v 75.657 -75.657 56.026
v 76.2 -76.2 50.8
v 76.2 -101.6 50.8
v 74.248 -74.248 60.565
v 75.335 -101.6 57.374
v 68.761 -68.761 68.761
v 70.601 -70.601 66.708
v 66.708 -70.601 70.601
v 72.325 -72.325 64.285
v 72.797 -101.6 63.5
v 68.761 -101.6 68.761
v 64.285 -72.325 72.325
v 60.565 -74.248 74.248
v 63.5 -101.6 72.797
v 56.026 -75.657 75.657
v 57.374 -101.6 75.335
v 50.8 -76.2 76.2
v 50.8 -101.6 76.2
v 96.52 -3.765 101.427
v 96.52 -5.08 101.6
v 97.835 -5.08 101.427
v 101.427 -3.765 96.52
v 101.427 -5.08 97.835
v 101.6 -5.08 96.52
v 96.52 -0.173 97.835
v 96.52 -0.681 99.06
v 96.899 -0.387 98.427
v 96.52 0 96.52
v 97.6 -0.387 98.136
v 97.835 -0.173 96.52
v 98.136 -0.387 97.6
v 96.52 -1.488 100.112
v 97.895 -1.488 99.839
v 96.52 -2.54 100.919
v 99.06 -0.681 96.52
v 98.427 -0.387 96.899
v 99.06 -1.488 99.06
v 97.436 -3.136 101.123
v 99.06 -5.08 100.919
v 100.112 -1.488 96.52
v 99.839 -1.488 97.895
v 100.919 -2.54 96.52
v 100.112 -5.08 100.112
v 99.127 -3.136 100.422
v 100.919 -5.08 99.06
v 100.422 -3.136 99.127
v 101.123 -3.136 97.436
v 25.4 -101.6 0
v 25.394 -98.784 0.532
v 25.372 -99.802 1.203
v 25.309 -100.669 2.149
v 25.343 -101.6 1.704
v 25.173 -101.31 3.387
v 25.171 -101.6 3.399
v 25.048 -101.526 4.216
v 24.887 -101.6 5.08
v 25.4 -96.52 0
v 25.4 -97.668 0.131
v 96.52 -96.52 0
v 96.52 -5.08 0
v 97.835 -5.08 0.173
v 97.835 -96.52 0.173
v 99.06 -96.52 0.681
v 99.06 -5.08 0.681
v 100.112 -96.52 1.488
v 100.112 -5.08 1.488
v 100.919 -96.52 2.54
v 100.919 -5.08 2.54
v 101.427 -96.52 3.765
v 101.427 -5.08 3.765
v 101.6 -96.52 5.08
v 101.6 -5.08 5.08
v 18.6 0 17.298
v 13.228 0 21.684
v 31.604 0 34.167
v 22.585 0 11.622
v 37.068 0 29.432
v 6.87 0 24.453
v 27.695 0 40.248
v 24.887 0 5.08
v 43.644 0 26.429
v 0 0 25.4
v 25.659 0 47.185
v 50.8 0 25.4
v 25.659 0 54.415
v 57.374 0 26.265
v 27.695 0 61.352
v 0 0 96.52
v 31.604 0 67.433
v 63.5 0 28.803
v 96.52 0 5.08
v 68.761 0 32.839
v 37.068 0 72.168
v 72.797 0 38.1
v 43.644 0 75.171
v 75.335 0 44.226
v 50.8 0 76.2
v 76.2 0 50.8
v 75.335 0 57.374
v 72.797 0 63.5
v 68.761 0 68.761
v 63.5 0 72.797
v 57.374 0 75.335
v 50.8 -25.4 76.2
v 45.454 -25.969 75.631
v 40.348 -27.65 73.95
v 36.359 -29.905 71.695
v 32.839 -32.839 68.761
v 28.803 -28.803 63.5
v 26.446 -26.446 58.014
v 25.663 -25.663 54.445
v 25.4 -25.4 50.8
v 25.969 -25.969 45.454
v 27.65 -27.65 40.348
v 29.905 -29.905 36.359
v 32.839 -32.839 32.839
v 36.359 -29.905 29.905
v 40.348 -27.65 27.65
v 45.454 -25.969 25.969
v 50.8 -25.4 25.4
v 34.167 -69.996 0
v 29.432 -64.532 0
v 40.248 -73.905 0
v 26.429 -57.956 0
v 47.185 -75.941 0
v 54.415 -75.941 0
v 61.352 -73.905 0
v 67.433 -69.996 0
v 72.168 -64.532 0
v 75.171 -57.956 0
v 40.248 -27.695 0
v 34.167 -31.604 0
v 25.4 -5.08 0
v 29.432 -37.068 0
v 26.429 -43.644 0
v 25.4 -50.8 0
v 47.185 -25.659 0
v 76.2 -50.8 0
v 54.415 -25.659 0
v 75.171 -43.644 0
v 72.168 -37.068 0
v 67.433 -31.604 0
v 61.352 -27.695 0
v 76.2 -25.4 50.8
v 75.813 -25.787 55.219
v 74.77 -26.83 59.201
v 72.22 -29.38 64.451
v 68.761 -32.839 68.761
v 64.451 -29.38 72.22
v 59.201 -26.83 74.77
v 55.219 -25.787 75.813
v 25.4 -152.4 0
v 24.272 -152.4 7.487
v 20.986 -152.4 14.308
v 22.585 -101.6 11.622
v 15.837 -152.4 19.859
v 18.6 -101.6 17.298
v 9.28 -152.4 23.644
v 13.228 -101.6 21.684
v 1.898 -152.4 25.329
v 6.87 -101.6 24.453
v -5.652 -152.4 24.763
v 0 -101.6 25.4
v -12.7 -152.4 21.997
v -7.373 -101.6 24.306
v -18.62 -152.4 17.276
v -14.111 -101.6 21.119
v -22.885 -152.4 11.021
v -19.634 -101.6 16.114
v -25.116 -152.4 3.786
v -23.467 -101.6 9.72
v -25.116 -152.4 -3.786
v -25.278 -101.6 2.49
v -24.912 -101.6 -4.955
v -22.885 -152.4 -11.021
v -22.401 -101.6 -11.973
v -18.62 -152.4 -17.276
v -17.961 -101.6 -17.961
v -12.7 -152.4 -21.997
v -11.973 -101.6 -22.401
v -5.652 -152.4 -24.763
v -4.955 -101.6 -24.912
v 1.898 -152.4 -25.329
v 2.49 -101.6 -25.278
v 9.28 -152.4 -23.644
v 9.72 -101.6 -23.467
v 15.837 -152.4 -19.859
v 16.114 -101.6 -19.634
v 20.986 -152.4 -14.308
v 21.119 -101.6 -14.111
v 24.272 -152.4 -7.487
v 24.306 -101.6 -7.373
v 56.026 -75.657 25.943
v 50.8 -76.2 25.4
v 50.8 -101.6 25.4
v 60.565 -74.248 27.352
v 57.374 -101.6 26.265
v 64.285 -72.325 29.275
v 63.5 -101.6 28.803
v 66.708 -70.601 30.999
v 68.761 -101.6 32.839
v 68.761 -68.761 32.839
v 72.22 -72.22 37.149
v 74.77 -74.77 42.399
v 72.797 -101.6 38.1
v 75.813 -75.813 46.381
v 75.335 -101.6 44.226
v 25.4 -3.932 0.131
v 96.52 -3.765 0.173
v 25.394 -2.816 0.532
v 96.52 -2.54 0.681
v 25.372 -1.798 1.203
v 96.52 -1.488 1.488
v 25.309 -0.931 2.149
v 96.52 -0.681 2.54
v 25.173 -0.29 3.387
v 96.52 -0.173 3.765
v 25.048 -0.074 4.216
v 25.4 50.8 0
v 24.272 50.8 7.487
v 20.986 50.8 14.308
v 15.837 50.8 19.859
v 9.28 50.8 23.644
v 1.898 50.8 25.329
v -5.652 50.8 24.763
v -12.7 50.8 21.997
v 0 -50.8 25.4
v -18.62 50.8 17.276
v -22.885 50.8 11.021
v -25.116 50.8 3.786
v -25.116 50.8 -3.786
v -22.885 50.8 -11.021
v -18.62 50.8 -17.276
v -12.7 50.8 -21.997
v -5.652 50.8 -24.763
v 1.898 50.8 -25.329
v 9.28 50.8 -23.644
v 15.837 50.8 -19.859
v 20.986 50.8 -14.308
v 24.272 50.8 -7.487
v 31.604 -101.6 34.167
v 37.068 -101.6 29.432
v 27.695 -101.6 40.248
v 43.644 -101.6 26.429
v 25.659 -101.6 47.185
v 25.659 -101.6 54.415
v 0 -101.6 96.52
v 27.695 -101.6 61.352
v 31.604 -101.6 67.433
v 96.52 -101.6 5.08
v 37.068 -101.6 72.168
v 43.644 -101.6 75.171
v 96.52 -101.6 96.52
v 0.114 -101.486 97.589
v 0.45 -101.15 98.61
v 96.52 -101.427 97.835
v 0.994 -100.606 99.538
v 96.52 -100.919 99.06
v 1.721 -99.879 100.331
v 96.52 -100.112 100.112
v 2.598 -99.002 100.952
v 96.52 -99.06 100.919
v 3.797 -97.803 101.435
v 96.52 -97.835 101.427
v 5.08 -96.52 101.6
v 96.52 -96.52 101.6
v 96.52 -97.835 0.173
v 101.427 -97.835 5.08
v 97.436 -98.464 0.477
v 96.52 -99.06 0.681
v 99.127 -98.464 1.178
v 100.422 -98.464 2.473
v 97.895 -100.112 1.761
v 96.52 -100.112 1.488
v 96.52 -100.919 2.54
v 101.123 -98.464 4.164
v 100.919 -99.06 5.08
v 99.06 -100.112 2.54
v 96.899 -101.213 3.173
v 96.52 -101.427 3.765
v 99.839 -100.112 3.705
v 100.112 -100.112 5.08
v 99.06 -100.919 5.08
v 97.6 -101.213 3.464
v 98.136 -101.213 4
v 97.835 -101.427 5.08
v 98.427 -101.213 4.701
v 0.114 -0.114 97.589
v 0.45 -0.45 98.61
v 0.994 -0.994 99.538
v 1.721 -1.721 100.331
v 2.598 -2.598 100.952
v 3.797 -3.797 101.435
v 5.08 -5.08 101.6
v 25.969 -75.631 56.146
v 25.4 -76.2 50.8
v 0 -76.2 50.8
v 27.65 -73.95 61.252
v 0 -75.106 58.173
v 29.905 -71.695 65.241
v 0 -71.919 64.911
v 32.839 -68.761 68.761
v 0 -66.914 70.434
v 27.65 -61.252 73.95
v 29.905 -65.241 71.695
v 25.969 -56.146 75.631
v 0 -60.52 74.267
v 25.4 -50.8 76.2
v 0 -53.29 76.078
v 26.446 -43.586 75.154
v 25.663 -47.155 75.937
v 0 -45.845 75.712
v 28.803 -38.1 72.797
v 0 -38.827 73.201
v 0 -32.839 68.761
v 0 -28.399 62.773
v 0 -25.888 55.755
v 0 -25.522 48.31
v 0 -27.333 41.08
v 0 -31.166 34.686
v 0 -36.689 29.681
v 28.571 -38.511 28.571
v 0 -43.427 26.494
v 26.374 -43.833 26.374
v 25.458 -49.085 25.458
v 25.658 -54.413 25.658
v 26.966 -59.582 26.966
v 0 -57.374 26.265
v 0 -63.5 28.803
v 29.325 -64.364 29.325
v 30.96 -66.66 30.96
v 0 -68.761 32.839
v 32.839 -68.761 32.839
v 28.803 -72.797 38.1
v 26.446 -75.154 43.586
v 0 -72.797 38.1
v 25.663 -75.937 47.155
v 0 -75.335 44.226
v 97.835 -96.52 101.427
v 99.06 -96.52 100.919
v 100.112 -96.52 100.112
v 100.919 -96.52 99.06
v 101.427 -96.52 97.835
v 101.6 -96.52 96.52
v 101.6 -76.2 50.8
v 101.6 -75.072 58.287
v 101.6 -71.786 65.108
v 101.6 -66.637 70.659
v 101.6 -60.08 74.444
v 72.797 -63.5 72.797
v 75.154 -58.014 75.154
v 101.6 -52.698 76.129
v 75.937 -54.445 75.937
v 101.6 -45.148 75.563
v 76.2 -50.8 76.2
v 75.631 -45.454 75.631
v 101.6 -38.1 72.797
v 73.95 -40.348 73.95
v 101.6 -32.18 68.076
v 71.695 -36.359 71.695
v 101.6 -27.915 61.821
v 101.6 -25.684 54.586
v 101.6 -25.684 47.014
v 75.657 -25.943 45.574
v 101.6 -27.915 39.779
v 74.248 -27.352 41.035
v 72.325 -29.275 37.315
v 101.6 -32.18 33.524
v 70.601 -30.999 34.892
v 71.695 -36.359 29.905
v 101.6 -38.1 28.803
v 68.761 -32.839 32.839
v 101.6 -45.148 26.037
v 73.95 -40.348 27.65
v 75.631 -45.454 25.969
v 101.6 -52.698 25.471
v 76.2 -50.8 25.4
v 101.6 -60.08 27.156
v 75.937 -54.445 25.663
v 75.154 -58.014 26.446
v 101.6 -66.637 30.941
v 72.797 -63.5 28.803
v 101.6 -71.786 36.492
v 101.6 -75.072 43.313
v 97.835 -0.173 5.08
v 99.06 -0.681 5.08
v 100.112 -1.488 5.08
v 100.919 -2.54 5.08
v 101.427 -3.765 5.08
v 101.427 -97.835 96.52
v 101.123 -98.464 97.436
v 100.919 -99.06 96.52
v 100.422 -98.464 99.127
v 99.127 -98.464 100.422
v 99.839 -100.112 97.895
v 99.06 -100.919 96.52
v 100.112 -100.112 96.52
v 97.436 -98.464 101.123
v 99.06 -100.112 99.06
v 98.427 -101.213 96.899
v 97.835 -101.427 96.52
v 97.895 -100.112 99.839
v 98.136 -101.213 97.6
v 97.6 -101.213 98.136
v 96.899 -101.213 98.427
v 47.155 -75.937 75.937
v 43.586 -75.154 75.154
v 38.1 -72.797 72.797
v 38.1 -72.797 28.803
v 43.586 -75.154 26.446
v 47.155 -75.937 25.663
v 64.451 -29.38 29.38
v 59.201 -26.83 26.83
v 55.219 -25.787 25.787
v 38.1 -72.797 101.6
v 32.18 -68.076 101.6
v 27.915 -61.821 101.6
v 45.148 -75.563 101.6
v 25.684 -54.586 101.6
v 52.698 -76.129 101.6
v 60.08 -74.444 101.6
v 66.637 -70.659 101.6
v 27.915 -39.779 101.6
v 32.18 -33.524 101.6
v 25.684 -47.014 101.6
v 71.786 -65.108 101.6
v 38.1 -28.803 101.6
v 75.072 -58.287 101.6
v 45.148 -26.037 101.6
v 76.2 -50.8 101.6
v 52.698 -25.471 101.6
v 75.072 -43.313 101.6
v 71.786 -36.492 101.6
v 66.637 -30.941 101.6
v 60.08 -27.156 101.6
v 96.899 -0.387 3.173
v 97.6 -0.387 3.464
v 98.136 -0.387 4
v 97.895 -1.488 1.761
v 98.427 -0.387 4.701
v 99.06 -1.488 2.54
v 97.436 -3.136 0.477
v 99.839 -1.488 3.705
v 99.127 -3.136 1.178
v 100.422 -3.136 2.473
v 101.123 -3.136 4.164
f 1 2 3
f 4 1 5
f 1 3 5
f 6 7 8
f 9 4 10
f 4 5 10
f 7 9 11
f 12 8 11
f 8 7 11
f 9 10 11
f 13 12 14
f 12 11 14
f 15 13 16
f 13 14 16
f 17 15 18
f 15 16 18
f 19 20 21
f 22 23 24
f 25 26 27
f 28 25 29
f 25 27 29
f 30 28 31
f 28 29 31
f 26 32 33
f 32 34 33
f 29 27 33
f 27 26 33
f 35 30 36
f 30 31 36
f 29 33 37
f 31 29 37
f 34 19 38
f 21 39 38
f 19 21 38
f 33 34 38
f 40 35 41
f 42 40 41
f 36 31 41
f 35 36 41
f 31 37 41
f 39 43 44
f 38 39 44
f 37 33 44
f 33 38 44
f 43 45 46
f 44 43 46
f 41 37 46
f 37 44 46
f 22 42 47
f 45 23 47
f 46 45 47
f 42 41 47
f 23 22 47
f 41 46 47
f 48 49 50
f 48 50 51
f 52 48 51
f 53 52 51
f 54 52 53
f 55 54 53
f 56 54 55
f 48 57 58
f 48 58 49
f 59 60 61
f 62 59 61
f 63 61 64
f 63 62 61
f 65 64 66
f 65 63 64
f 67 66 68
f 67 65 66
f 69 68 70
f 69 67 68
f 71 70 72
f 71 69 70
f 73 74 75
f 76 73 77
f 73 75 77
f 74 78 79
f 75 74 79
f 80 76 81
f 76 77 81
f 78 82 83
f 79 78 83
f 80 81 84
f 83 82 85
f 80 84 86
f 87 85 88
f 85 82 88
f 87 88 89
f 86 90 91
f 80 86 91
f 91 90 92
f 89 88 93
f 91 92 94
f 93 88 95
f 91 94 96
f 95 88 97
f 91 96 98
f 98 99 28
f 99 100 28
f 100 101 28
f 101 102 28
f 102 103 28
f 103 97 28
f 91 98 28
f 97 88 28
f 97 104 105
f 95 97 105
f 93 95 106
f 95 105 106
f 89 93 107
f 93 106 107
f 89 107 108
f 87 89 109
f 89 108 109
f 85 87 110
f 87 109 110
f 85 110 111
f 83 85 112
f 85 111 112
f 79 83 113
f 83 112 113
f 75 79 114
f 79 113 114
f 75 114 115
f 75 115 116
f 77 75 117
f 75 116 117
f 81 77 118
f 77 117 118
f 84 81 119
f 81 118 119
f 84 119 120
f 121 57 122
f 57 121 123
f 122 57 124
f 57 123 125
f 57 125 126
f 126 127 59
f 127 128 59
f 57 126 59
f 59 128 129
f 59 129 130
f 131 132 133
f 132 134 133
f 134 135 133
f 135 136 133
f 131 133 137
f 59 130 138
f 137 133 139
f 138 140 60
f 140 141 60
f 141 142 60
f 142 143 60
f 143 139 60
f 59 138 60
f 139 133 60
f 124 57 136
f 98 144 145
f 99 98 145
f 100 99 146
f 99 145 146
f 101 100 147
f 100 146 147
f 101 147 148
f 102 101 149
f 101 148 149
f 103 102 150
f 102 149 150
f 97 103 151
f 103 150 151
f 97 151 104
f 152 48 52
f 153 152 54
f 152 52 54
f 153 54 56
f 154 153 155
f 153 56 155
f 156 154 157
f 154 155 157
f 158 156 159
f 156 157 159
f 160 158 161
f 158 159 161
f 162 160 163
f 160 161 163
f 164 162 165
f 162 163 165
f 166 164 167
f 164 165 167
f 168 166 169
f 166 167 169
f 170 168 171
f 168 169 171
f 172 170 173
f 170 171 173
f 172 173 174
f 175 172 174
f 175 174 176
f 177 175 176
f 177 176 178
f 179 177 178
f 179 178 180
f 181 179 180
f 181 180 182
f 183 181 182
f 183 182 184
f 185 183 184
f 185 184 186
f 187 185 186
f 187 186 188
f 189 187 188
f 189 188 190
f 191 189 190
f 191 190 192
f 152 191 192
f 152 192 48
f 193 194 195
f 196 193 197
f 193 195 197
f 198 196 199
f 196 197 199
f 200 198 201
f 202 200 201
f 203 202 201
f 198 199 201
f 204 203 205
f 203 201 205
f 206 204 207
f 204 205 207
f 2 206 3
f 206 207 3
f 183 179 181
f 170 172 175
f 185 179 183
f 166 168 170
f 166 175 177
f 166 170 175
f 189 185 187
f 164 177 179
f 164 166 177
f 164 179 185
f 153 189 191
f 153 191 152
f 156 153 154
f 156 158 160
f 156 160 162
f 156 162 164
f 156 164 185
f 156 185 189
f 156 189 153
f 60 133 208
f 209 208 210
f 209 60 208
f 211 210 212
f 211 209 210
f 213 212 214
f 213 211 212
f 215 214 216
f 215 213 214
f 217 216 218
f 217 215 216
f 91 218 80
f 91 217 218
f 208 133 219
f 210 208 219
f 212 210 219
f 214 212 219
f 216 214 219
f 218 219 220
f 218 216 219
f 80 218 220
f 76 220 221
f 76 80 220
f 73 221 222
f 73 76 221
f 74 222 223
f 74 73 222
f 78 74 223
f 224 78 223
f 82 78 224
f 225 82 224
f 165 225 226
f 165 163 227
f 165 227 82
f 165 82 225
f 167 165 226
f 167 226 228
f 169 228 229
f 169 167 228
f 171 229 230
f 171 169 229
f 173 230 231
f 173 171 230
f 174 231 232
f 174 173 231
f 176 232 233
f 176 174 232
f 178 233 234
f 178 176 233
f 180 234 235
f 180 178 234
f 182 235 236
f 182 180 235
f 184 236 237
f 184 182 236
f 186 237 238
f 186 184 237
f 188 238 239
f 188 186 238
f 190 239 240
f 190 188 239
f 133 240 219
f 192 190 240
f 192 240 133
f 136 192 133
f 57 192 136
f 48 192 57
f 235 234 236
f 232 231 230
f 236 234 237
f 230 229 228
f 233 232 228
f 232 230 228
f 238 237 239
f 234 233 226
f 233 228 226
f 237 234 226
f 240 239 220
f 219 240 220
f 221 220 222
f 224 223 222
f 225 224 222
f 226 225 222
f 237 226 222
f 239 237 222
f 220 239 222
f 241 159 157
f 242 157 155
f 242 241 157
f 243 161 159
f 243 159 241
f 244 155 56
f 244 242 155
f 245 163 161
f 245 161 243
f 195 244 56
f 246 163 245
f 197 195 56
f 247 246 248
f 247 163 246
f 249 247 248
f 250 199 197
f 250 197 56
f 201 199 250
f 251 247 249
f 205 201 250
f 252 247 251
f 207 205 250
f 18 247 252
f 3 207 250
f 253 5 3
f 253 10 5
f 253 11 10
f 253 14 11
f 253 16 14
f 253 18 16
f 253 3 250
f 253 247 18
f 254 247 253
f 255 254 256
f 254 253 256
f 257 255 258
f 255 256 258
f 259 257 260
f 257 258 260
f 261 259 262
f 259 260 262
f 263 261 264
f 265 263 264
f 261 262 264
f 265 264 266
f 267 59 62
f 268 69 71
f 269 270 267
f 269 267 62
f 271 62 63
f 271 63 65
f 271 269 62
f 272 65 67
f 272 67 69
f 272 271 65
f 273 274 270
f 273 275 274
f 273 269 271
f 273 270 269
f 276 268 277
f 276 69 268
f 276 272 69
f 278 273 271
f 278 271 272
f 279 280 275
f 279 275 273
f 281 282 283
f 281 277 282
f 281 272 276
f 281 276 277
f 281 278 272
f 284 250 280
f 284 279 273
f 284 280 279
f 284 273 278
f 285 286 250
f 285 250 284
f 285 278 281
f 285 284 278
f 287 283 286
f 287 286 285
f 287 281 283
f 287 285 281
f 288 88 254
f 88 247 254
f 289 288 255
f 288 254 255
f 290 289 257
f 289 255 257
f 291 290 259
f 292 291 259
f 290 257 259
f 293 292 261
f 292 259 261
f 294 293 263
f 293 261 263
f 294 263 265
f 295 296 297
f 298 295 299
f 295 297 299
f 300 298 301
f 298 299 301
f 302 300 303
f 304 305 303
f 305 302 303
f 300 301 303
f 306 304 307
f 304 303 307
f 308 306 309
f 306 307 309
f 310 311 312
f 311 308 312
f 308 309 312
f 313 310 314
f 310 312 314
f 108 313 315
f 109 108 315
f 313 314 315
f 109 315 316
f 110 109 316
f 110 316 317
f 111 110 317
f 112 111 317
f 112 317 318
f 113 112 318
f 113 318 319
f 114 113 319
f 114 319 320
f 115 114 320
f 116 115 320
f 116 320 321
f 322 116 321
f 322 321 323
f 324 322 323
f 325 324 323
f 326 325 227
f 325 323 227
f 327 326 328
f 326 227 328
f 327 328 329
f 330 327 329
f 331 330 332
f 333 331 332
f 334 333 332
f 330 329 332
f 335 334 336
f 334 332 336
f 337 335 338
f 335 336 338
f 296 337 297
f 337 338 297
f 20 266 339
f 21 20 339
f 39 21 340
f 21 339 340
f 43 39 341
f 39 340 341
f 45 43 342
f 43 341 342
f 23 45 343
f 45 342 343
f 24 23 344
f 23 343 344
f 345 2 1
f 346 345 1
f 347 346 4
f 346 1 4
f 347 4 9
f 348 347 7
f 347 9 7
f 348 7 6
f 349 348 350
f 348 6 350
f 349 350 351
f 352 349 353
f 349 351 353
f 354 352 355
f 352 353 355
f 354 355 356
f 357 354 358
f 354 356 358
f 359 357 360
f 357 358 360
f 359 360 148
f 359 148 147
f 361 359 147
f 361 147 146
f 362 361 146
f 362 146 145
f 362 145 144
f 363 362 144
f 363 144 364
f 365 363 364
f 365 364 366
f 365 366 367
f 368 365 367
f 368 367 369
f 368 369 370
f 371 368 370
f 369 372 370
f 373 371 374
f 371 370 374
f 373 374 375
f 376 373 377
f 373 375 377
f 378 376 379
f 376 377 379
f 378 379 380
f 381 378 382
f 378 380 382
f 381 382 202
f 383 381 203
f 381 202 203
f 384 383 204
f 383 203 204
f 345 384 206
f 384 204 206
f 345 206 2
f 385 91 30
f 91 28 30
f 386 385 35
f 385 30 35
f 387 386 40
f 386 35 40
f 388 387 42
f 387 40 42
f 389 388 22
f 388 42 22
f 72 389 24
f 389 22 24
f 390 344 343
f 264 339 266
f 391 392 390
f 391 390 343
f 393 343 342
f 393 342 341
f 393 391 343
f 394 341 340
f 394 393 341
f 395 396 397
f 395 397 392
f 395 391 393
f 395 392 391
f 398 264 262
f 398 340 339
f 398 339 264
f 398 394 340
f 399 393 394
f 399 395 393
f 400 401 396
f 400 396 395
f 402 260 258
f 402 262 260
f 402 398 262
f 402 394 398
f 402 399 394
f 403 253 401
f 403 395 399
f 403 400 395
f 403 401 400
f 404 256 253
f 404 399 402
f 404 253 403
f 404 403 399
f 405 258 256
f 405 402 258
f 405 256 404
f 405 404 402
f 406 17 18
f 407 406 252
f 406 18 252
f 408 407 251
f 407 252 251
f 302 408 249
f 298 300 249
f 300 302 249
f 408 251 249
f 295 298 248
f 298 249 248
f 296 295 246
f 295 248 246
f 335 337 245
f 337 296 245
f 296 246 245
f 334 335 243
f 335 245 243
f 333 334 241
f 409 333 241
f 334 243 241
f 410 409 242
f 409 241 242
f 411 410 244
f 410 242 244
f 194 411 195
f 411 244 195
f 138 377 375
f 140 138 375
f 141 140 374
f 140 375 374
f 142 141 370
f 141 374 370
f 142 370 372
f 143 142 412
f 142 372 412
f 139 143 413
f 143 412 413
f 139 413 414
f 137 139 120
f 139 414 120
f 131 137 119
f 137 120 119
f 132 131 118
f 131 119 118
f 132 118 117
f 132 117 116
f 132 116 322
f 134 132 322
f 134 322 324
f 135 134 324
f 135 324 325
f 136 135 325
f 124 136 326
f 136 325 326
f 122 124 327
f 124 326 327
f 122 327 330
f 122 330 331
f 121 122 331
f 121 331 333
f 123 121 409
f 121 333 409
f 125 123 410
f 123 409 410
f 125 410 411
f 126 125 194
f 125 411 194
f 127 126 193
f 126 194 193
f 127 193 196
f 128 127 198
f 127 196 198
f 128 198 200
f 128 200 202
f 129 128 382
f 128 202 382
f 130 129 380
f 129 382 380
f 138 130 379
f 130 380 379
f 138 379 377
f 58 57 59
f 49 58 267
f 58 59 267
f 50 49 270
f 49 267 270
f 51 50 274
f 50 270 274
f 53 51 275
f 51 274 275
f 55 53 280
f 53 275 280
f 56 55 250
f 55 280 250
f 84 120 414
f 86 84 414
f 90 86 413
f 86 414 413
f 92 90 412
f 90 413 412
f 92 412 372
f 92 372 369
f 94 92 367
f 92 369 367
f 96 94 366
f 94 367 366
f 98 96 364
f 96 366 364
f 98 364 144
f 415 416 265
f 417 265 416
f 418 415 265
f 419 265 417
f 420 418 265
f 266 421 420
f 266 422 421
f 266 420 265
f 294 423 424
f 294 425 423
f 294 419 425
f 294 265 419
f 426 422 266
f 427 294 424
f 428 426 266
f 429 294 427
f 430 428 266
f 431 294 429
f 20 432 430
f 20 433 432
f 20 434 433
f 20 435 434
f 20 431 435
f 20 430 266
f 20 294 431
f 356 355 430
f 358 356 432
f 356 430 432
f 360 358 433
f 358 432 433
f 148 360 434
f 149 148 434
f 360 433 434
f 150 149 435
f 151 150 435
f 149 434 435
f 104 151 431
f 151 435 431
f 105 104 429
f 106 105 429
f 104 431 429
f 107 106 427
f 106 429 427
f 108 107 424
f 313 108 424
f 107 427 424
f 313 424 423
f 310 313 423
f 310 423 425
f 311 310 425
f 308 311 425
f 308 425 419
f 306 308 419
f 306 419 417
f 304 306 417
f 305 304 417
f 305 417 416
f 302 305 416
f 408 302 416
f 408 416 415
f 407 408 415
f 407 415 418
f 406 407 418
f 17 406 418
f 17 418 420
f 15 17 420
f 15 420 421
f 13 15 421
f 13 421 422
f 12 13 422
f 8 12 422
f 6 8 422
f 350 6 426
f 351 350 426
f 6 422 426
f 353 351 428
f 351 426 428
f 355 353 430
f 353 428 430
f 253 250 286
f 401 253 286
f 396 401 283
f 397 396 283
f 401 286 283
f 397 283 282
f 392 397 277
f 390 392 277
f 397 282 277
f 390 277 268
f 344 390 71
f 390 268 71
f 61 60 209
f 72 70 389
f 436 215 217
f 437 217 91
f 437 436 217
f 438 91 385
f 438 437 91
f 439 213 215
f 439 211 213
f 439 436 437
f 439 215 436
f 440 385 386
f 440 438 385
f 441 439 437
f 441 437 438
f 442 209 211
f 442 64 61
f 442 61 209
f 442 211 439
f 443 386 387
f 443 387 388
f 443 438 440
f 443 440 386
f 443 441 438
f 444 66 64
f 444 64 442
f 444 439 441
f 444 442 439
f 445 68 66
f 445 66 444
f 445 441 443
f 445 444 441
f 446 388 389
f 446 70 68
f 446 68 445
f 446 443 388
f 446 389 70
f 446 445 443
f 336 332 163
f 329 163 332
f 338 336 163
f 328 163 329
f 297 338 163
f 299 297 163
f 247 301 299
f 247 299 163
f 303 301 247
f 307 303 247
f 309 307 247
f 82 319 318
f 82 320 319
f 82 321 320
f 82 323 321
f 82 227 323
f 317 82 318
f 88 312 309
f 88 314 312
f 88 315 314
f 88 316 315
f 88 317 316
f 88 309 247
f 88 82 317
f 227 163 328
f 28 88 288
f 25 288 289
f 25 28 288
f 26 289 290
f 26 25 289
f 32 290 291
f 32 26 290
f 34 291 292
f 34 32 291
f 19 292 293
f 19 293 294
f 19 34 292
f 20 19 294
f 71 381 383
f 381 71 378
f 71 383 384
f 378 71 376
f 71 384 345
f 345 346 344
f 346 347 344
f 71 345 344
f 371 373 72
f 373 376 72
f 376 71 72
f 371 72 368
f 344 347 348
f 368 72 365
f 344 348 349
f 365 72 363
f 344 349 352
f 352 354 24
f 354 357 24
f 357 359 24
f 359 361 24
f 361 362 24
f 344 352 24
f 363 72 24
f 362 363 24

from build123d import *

# Parameters (mm, degrees)
F0_W           = 101.6
F0_H           = 101.6
F1_DEPTH       = 101.6
F2_R           = 25.4
F3_DEPTH       = 101.6
F4_R           = 25.4
F5_DEPTH       = 101.6
F7_DEPTH       = 101.6
F8_R           = 5.08
F10_T1_DEPTH   = 91.44
F10_S5_W       = 5.08
F10_S5_H       = 5.08
F10_T6_DEPTH   = 5.08
F10_S11_W      = 5.08
F10_S11_H      = 5.08
F10_T12_DEPTH  = 5.08
F11_R          = 25.4
F12_DEPTH      = 50.8
F12_DEPTH_BACK = 152.4


# Not quite as in the source:
# - a fillet or chamfer that OpenCascade refuses, or shapes differently, is made with other operations: its cross-section is extruded or revolved along the edge and cut away or added


with BuildPart() as f1:
    # F0 (on Front) → F1 (new body)
    with BuildSketch(Plane.XZ):
        with Locations((50.8, 50.8)):
            Rectangle(F0_W, F0_H)
    extrude(amount=F1_DEPTH)

    # F2 (on face) → F3 (cut)
    with BuildSketch(Plane.XY.offset(101.6)):
        with Locations((50.8, -50.8)):
            Circle(F2_R)
    extrude(amount=-F3_DEPTH, mode=Mode.SUBTRACT)

    # F4 (on face) → F5 (cut)
    with BuildSketch(Plane(origin=(0, 0, 0), x_dir=(0, -1, 0), z_dir=(-1, 0, 0))):
        with Locations((50.8, 50.8)):
            Circle(F4_R)
    extrude(amount=-F5_DEPTH, mode=Mode.SUBTRACT)

    # F6 (on face) → F7 (cut)
    with BuildSketch(Plane.XZ.offset(101.6)):
        with BuildLine():
            ThreePointArc((76.2, 50.8), (68.7605122421, 68.7605122421), (50.8, 76.2))
            Line((50.8, 76.2), (50.8, 25.4))
            ThreePointArc((50.8, 25.4), (68.7605122421, 32.8394877579), (76.2, 50.8))
        make_face()
        with BuildLine():
            Line((50.8, 25.4), (50.8, 76.2))
            ThreePointArc((50.8, 76.2), (25.4, 50.8), (50.8, 25.4))
        make_face()
    extrude(amount=-F7_DEPTH, mode=Mode.SUBTRACT)

    # F8
    f8_edges = [f1.edges().sort_by_distance(p)[0] for p in [
        (50.8, -101.6, 101.6),
        (101.6, -50.8, 101.6),
        (50.8, 0, 101.6),
        (0, -50.8, 101.6),
        (101.6, -50.8, 0),
        (50.8, -101.6, 0),
        (0, -50.8, 0),
        (50.8, 0, 0),
        (101.6, 0, 50.8),
    ]]
    fillet(f8_edges, radius=F8_R)

    # F10: fillet of radius 5.08 on 1 edges, made by hand

    # F10_s2 → F10_t1 (cut)
    with BuildSketch(Plane.XY.offset(5.08)):
        with BuildLine():
            ThreePointArc((96.52, -101.6), (100.1121024484, -100.1121024484), (101.6, -96.52))
            Line((101.6, -96.52), (101.6, -101.6))
            Line((101.6, -101.6), (96.52, -101.6))
        make_face()
    extrude(amount=F10_T1_DEPTH, mode=Mode.SUBTRACT)


with BuildPart() as f10_tool4:
    # F10_s5 → F10_t6 (new body)
    with BuildSketch(Plane.XZ.offset(96.52)):
        with Locations((99.06, 2.54)):
            Rectangle(F10_S5_W, F10_S5_H)
    extrude(amount=F10_T6_DEPTH)

    # F10_s7 → F10_t8 (revolve, cut)
    with BuildSketch(Plane(origin=(96.52, -96.52, 5.08), x_dir=(-0.7071067812, 0, 0.7071067812), z_dir=(0.7071067812, 0, 0.7071067812))):
        with BuildLine():
            ThreePointArc((0, -5.08), (5.08, 0), (0, 5.08))
            Line((0, 5.08), (0, -5.08))
        make_face()
    revolve(axis=Axis((96.52, -96.52, 5.08), (0, -1, 0)), mode=Mode.SUBTRACT)


with BuildPart() as f1_1:
    add(f1.part)

    # F10_t3: cut F10_tool4
    add(f10_tool4.part, mode=Mode.SUBTRACT)


with BuildPart() as f10_tool10:
    # F10_s11 → F10_t12 (new body)
    with BuildSketch(Plane.XZ.offset(96.52)):
        with Locations((99.06, 99.06)):
            Rectangle(F10_S11_W, F10_S11_H)
    extrude(amount=F10_T12_DEPTH)

    # F10_s13 → F10_t14 (revolve, cut)
    with BuildSketch(Plane(origin=(96.52, -96.52, 96.52), x_dir=(-0.7071067812, 0, -0.7071067812), z_dir=(-0.7071067812, 0, 0.7071067812))):
        with BuildLine():
            ThreePointArc((0, -5.08), (5.08, 0), (0, 5.08))
            Line((0, 5.08), (0, -5.08))
        make_face()
    revolve(axis=Axis((96.52, -96.52, 96.52), (0, -1, 0)), mode=Mode.SUBTRACT)


with BuildPart() as f1_2:
    add(f1_1.part)

    # F10_t9: cut F10_tool10
    add(f10_tool10.part, mode=Mode.SUBTRACT)

    # F11 (on offset) → F12 (join, two sides)
    with BuildSketch(Plane.XZ.offset(101.6)) as f12_sk:
        Circle(F11_R)
    extrude(amount=F12_DEPTH)
    extrude(f12_sk.sketch, amount=-F12_DEPTH_BACK)


solid = f1_2.part
